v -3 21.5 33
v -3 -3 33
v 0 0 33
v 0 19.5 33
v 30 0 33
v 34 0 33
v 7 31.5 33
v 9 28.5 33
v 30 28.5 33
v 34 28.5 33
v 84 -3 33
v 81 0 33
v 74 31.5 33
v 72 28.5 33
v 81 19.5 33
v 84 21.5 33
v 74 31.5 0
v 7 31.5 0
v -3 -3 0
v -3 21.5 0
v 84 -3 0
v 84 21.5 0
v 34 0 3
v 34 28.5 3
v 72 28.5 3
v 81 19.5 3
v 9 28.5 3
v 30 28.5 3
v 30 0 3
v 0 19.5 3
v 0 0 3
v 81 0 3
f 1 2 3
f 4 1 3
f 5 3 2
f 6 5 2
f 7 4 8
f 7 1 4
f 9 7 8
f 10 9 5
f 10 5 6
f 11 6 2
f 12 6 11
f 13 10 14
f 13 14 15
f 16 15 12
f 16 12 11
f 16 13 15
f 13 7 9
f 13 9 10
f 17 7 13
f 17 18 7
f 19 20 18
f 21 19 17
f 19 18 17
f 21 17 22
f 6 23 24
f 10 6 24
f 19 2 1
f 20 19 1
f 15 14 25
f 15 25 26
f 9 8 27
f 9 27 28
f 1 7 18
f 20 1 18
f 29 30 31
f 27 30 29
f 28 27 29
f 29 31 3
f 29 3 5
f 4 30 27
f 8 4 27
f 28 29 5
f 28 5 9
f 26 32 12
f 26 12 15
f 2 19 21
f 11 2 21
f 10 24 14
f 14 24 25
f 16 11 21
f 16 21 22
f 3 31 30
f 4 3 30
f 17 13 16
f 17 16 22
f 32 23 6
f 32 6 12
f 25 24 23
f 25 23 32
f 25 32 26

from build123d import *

# Parameters (mm, degrees)
SKETCH_1_W           = 81
SKETCH_1_H           = 28.5
EXTRUDE_1_DEPTH      = 3
EXTRUDE_2_DEPTH      = 30
EXTRUDE_2_DEPTH_BACK = 3
SKETCH_2_W           = 87
SKETCH_2_H           = 34.5
SKETCH_2_W_2         = 81
SKETCH_2_H_2         = 28.5
SKETCH_3_W           = 4
SKETCH_3_H           = 28.5
EXTRUDE_3_DEPTH      = 30
EXTRUDE_4_DEPTH      = 30
CHAMFER_1_SIZE       = 10


with BuildPart() as part:
    # 草图1 → 凸台-拉伸1 (new body)
    with BuildSketch(Plane.XY):
        with Locations((40.5, 14.25)):
            Rectangle(SKETCH_1_W, SKETCH_1_H)
    extrude(amount=EXTRUDE_1_DEPTH)

    # 草图2 → 凸台-拉伸2 (add, two sides: drawn at the far end of the back side and taken through both)
    with BuildSketch(Plane.XY.offset(3).offset(-EXTRUDE_2_DEPTH_BACK)):
        with Locations((40.5, 14.25)):
            Rectangle(SKETCH_2_W, SKETCH_2_H)
        with Locations((40.5, 14.25)):
            Rectangle(SKETCH_2_W_2, SKETCH_2_H_2, mode=Mode.SUBTRACT)
    extrude(amount=EXTRUDE_2_DEPTH + EXTRUDE_2_DEPTH_BACK)

    # 草图3 → 凸台-拉伸3 (add)
    with BuildSketch(Plane.XY.offset(3)):
        with Locations((32, 14.25)):
            Rectangle(SKETCH_3_W, SKETCH_3_H)
    extrude(amount=EXTRUDE_3_DEPTH)

    # 草图4 → 凸台-拉伸4 (add)
    with BuildSketch(Plane.XY.offset(3)):
        Polygon((-3, 16.5), (12, 31.5), (-3, 31.5), align=None)
        Polygon((69, 31.5), (84, 16.5), (84, 31.5), align=None)
    extrude(amount=EXTRUDE_4_DEPTH)

    # 倒角1
    chamfer_1_edges = [part.edges().sort_by_distance(p)[0] for p in [
        (-3, 31.5, 16.5),
        (84, 31.5, 16.5),
    ]]
    chamfer(chamfer_1_edges, length=CHAMFER_1_SIZE)


solid = part.part
